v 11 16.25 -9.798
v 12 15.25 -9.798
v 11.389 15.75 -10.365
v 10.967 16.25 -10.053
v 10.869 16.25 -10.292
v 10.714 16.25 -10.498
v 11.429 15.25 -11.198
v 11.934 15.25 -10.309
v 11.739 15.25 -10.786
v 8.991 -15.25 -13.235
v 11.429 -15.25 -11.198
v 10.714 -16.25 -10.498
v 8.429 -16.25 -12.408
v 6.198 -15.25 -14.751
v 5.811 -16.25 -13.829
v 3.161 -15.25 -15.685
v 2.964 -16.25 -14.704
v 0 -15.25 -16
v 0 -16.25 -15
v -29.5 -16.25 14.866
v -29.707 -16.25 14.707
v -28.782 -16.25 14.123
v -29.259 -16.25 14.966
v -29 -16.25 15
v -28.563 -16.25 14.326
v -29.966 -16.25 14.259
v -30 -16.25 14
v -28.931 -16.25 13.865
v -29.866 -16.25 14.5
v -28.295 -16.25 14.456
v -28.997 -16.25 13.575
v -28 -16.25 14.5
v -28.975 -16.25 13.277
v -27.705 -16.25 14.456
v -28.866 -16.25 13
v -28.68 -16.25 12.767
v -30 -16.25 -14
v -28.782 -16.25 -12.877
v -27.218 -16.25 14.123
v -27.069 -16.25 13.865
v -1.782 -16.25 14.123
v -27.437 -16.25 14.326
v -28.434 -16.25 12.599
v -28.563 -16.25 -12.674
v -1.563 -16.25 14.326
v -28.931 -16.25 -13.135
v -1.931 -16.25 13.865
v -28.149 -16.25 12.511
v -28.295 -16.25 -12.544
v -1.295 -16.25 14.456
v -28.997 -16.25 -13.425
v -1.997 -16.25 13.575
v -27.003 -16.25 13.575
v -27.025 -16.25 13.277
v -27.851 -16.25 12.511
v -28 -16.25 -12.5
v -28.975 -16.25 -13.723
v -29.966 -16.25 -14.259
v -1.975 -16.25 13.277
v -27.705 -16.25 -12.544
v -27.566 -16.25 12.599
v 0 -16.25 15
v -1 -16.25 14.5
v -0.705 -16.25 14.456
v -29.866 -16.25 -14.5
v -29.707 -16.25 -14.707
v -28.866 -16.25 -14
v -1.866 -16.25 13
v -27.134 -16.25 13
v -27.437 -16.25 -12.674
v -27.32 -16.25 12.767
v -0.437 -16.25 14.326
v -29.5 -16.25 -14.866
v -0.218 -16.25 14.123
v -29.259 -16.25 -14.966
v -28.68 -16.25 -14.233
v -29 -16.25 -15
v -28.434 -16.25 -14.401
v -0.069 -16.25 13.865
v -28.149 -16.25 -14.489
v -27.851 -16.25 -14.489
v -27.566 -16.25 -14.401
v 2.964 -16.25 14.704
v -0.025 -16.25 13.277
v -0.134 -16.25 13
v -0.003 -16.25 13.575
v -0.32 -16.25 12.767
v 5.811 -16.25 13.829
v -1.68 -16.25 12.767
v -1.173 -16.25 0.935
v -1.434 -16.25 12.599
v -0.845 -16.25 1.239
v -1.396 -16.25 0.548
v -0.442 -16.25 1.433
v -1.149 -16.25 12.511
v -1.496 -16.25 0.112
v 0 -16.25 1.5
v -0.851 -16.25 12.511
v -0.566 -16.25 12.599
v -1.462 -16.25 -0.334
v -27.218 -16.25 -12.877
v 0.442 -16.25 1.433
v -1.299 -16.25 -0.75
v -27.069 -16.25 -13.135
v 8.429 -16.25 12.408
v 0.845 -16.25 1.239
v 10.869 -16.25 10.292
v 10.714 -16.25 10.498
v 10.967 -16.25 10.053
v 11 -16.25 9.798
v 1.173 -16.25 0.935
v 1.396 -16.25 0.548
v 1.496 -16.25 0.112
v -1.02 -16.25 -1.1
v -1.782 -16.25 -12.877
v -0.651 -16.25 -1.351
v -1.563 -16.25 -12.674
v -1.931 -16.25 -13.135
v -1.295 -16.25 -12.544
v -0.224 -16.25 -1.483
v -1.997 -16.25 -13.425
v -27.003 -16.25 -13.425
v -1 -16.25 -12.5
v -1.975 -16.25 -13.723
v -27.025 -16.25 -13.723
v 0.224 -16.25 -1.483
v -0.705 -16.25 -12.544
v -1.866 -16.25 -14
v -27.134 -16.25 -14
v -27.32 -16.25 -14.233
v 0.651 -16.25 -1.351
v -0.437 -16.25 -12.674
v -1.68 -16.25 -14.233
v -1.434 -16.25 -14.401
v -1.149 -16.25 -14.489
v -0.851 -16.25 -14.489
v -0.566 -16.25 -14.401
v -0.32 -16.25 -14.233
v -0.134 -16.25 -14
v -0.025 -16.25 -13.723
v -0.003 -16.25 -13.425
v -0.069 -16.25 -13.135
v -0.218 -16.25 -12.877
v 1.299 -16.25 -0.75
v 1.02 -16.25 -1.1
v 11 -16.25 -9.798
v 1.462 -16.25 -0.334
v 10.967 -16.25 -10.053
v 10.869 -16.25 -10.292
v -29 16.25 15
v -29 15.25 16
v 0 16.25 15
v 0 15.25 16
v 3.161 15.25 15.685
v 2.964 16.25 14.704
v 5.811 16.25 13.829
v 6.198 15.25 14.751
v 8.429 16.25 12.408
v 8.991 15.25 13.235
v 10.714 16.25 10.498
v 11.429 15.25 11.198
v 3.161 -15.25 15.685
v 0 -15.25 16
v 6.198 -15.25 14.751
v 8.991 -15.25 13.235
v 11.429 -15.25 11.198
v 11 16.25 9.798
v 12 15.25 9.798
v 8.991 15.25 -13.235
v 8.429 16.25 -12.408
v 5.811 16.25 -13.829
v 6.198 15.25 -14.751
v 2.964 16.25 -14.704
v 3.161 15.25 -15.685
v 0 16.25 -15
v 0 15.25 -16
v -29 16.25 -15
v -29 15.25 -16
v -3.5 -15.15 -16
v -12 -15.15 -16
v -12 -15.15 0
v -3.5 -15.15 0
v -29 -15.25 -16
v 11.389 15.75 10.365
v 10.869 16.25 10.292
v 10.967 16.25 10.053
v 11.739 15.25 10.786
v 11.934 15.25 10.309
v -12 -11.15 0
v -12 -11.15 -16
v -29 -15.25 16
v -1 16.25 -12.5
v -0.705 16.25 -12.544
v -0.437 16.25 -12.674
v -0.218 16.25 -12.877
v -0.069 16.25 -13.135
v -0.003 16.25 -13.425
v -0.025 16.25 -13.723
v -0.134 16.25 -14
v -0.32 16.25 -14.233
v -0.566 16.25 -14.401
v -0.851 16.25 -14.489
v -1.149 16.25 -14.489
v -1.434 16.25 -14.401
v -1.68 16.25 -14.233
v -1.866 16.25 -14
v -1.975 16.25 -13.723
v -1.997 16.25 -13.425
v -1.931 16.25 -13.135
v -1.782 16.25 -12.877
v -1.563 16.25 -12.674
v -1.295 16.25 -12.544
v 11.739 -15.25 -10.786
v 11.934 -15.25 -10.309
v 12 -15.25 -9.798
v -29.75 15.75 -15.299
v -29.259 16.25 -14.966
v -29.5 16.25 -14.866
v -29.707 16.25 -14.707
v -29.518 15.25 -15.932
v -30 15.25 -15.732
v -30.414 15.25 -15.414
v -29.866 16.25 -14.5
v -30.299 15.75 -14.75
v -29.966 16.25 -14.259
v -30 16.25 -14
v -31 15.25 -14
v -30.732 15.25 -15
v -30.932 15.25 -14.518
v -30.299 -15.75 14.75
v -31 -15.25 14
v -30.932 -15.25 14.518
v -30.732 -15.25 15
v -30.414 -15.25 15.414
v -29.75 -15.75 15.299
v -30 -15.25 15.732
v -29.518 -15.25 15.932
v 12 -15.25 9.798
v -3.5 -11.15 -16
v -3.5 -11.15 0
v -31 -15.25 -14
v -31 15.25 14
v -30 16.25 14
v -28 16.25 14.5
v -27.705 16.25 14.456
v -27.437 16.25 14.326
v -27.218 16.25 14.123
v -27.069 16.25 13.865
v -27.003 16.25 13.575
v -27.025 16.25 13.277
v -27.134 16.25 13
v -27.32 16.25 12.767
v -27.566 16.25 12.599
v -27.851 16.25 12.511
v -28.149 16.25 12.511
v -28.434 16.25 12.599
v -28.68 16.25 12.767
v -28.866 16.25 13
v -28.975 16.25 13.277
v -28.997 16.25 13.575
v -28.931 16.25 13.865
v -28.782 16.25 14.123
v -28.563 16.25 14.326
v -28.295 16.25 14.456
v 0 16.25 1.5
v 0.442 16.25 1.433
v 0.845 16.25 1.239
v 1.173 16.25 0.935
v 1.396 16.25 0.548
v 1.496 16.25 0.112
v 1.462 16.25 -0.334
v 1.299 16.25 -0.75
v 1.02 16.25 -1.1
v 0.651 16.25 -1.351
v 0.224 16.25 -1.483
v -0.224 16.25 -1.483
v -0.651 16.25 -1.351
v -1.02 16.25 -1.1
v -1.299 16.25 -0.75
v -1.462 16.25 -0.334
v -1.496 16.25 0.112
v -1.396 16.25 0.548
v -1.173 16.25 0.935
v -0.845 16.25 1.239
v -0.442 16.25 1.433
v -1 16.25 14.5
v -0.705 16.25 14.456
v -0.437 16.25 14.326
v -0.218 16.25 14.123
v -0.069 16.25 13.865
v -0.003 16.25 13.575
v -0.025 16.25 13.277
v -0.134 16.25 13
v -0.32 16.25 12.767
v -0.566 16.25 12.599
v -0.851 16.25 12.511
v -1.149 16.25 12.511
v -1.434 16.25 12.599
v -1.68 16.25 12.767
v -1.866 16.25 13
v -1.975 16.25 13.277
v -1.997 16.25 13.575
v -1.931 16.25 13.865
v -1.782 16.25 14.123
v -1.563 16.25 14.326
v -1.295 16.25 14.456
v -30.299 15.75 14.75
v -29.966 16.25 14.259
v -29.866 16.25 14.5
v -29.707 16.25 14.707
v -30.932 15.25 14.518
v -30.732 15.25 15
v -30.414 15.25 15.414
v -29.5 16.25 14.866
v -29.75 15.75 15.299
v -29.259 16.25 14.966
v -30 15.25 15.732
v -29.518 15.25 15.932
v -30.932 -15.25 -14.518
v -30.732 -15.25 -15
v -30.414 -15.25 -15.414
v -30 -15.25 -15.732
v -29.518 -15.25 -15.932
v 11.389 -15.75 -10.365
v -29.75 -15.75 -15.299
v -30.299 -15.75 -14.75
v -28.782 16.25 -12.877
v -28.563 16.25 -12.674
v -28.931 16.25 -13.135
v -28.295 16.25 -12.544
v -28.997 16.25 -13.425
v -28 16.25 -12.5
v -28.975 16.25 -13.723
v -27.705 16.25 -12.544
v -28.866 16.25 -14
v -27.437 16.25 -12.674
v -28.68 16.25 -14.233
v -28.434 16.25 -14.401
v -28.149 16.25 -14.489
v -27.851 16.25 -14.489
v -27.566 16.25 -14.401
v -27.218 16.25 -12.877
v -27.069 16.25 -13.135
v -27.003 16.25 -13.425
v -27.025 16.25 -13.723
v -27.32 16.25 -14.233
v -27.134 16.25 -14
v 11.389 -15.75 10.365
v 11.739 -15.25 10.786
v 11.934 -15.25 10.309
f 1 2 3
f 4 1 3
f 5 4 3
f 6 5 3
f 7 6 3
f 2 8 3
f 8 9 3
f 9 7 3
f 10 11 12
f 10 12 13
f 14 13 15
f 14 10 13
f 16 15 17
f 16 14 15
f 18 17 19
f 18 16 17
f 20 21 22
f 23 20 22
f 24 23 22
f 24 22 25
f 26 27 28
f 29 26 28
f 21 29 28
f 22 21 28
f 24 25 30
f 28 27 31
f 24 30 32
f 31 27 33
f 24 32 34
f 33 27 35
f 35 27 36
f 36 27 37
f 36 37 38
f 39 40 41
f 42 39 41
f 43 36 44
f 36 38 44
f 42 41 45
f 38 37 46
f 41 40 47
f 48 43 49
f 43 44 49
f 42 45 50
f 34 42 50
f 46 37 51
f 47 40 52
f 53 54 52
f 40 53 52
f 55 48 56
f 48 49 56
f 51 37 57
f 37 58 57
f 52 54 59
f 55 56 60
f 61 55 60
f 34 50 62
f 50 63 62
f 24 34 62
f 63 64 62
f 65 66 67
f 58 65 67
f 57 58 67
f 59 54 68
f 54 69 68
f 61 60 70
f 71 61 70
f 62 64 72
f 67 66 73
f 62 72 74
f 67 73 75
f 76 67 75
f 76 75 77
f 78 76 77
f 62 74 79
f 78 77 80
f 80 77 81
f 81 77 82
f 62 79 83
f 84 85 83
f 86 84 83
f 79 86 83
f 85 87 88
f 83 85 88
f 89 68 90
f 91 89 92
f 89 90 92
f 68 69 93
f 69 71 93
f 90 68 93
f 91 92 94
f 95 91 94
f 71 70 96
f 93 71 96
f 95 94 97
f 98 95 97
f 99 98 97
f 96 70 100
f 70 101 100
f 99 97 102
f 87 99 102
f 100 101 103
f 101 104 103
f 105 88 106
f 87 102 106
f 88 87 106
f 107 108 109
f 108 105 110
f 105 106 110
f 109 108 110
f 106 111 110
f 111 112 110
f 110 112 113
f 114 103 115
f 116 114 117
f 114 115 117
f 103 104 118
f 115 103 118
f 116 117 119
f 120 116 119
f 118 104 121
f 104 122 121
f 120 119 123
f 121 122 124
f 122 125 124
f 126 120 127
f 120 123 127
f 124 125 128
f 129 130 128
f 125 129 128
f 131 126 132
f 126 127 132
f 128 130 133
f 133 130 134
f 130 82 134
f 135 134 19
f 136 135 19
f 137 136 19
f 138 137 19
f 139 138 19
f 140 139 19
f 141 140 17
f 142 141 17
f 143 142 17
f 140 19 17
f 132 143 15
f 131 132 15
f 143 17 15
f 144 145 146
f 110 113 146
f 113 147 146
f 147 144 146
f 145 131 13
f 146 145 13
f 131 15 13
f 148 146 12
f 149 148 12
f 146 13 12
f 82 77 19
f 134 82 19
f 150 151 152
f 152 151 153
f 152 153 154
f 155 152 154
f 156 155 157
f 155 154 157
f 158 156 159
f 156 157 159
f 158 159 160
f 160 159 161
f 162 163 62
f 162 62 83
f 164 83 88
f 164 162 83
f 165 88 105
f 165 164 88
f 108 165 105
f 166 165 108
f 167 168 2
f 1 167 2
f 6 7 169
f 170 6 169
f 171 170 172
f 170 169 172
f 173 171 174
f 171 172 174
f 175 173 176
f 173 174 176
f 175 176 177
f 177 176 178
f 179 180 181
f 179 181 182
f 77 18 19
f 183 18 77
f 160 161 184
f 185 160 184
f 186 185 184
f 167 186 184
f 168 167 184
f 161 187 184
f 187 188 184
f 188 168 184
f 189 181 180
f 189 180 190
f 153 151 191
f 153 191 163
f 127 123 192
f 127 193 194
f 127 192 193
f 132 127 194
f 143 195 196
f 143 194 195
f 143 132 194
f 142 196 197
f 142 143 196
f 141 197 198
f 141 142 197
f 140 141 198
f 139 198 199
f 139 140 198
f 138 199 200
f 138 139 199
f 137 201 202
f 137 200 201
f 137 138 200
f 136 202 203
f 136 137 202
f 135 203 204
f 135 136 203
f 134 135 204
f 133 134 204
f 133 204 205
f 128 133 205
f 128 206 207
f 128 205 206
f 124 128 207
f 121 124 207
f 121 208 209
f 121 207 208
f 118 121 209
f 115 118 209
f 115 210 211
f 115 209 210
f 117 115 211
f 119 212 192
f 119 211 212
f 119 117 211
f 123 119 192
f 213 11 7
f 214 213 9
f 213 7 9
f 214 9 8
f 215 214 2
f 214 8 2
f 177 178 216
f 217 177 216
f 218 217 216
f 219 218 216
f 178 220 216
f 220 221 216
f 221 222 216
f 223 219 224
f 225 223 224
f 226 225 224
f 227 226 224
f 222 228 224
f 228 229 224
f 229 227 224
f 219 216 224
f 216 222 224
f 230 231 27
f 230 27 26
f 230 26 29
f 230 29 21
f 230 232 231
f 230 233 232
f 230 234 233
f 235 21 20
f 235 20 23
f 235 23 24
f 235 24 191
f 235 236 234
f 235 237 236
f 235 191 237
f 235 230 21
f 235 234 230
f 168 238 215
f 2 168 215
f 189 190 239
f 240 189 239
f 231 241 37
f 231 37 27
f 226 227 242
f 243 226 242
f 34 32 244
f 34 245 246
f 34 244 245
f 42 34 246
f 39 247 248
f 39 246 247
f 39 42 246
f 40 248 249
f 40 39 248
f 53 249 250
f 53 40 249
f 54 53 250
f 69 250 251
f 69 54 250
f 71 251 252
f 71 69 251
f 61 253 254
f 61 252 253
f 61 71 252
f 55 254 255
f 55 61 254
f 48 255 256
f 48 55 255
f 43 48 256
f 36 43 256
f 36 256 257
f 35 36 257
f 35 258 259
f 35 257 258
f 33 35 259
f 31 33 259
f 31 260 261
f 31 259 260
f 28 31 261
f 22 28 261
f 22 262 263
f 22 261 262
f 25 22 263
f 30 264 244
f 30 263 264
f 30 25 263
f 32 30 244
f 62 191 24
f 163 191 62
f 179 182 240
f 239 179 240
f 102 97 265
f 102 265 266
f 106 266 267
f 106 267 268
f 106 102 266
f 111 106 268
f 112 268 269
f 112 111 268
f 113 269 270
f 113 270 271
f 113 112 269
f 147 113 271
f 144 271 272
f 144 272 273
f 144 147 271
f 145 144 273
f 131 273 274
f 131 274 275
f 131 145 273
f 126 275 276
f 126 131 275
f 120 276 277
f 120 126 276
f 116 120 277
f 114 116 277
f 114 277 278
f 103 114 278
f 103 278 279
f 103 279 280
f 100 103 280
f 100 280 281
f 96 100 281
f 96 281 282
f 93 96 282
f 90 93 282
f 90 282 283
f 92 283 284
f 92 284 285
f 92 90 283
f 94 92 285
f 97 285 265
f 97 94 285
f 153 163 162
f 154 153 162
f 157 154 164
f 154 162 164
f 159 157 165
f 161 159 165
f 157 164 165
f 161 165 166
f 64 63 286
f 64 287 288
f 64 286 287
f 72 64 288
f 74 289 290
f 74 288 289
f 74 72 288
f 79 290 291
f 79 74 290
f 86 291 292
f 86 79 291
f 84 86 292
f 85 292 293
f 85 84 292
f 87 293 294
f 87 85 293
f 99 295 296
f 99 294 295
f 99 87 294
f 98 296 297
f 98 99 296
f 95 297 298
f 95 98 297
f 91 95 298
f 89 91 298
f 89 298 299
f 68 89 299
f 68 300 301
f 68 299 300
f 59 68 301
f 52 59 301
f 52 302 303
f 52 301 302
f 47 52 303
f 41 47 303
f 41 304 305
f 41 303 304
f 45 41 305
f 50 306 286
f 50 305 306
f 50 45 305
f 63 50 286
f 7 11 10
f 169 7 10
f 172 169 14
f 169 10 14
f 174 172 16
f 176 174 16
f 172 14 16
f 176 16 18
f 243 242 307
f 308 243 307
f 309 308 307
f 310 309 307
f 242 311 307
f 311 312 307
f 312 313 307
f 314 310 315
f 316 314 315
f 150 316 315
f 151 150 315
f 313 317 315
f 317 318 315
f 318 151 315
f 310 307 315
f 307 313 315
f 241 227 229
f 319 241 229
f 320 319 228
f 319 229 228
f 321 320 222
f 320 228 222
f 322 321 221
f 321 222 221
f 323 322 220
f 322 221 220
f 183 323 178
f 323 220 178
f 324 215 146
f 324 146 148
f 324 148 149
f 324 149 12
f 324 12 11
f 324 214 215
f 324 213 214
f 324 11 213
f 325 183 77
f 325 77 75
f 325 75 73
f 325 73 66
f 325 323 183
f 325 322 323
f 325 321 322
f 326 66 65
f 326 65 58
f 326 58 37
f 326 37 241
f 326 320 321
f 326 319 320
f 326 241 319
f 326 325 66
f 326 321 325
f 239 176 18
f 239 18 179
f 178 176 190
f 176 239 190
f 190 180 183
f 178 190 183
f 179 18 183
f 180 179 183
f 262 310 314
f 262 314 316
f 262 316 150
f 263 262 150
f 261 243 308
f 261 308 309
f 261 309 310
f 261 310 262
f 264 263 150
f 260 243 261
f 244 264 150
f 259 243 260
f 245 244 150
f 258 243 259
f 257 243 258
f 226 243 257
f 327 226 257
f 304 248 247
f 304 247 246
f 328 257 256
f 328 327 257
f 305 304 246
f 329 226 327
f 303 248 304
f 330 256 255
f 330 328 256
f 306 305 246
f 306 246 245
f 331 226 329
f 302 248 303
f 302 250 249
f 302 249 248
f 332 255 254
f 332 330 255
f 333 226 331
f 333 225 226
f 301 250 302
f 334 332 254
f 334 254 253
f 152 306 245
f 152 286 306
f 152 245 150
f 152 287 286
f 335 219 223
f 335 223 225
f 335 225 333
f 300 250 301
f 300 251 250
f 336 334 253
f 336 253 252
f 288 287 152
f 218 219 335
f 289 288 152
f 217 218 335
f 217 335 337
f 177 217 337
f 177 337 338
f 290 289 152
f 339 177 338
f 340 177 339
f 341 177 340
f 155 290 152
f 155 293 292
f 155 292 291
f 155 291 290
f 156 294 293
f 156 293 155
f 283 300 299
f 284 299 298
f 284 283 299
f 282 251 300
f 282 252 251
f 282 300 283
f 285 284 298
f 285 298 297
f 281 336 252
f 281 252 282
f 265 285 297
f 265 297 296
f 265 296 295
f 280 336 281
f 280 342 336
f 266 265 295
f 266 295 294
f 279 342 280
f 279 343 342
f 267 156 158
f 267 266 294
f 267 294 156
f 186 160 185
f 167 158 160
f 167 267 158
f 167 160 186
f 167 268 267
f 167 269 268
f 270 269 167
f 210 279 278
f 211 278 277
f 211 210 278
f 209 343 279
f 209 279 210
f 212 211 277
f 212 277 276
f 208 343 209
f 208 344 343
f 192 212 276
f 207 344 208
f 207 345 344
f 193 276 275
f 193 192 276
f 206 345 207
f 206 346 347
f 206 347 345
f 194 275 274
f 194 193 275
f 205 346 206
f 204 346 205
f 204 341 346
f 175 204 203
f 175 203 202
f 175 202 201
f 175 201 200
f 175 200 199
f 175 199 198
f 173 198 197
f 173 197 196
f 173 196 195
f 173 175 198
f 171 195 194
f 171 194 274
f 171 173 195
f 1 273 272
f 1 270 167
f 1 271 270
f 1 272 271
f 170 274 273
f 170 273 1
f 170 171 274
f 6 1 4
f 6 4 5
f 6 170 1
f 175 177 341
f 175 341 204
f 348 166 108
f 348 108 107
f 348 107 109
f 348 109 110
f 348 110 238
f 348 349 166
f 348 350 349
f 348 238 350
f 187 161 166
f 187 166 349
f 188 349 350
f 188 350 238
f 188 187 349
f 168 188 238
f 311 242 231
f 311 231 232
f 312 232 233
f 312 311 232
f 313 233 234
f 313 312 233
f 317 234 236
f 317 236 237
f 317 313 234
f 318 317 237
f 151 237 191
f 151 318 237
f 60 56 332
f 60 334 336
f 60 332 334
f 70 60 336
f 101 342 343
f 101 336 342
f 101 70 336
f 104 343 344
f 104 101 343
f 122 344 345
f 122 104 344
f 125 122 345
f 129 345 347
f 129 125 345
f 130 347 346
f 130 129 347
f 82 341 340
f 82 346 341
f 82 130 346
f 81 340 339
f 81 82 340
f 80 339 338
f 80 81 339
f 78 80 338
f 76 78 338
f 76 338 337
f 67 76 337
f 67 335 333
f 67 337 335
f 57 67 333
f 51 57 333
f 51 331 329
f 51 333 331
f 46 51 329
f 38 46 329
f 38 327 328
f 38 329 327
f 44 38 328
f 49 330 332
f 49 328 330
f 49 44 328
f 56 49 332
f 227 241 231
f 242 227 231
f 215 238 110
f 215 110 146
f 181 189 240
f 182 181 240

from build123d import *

# Parameters (mm, degrees)
EXTRUDE_1_DEPTH          = 16.25
EXTRUDE_1_DEPTH_BACK     = 16.25
SKETCH_2_R               = 1.5
CUT_EXTRUDE_1_DEPTH      = 39.484574832
CUT_EXTRUDE_1_DEPTH_BACK = 39.484574832
SKETCH_3_R               = 1
FILLET_1_R               = 2
CHAMFER_1_SIZE           = 1
SKETCH_4_W               = 8.5
SKETCH_4_H               = 4
CUT_EXTRUDE_2_DEPTH      = 39.484574832


with BuildPart() as part:
    # Эскиз2 → Бобышка-Вытянуть1 (new, two sides: drawn at the far end of the back side and taken through both)
    with BuildSketch(Plane(origin=(0, 0, 0), x_dir=(1, 0, 0), z_dir=(0, 1, 0)).offset(-EXTRUDE_1_DEPTH_BACK)):
        with BuildLine():
            Line((-31, 16), (-31, -16))
            Line((-31, -16), (0, -16))
            ThreePointArc((0, -16), (6.583005244, -14.583005244), (12, -10.583005244))
            Line((12, -10.583005244), (12, 10.583005244))
            ThreePointArc((12, 10.583005244), (6.583005244, 14.583005244), (0, 16))
            Line((0, 16), (-31, 16))
        make_face()
        Circle(SKETCH_2_R, mode=Mode.SUBTRACT)
    extrude(amount=EXTRUDE_1_DEPTH + EXTRUDE_1_DEPTH_BACK)

    # Эскиз3 → Вырез-Вытянуть1 (cut, two sides: drawn at the far end of the back side and taken through both)
    with BuildSketch(Plane(origin=(0, 0, 0), x_dir=(1, 0, 0), z_dir=(0, 1, 0)).offset(-CUT_EXTRUDE_1_DEPTH_BACK)):
        with Locations((-28, 13.5)):
            Circle(SKETCH_3_R)
        with Locations((-1, 13.5)):
            Circle(SKETCH_3_R)
        with Locations((-1, -13.5)):
            Circle(SKETCH_3_R)
        with Locations((-28, -13.5)):
            Circle(SKETCH_3_R)
    extrude(amount=CUT_EXTRUDE_1_DEPTH + CUT_EXTRUDE_1_DEPTH_BACK, mode=Mode.SUBTRACT)

    # Скругление1
    fillet_1_edges = [part.edges().sort_by_distance(p)[0] for p in [
        (12, 0, -10.583005244),
        (12, 0, 10.583005244),
        (-31, 0, -16),
        (-31, 0, 16),
    ]]
    fillet(fillet_1_edges, radius=FILLET_1_R)

    # Фаска1
    chamfer_1_edges = [part.edges().sort_by_distance(p)[0] for p in [
        (6.198278861, -16.25, -14.750638602),
        (-14.5, -16.25, -16),
        (11.8516402, -16.25, -10.553887917),
        (-30.414213562, -16.25, -15.414213562),
        (12, -16.25, 0),
        (-31, -16.25, 0),
        (11.8516402, -16.25, 10.553887917),
        (-30.414213562, -16.25, 15.414213562),
        (6.198278861, -16.25, 14.750638602),
        (-14.5, -16.25, 16),
        (6.198278861, 16.25, -14.750638602),
        (-14.5, 16.25, -16),
        (11.8516402, 16.25, -10.553887917),
        (-30.414213562, 16.25, -15.414213562),
        (12, 16.25, 0),
        (-31, 16.25, 0),
        (11.8516402, 16.25, 10.553887917),
        (-30.414213562, 16.25, 15.414213562),
        (6.198278861, 16.25, 14.750638602),
        (-14.5, 16.25, 16),
    ]]
    chamfer(chamfer_1_edges, length=CHAMFER_1_SIZE)

    # Эскиз4 → Вырез-Вытянуть2 (cut, through all)
    with BuildSketch(Plane.XY):
        with Locations((-7.75, -13.15)):
            Rectangle(SKETCH_4_W, SKETCH_4_H)
    extrude(amount=-CUT_EXTRUDE_2_DEPTH, mode=Mode.SUBTRACT)


solid = part.part
